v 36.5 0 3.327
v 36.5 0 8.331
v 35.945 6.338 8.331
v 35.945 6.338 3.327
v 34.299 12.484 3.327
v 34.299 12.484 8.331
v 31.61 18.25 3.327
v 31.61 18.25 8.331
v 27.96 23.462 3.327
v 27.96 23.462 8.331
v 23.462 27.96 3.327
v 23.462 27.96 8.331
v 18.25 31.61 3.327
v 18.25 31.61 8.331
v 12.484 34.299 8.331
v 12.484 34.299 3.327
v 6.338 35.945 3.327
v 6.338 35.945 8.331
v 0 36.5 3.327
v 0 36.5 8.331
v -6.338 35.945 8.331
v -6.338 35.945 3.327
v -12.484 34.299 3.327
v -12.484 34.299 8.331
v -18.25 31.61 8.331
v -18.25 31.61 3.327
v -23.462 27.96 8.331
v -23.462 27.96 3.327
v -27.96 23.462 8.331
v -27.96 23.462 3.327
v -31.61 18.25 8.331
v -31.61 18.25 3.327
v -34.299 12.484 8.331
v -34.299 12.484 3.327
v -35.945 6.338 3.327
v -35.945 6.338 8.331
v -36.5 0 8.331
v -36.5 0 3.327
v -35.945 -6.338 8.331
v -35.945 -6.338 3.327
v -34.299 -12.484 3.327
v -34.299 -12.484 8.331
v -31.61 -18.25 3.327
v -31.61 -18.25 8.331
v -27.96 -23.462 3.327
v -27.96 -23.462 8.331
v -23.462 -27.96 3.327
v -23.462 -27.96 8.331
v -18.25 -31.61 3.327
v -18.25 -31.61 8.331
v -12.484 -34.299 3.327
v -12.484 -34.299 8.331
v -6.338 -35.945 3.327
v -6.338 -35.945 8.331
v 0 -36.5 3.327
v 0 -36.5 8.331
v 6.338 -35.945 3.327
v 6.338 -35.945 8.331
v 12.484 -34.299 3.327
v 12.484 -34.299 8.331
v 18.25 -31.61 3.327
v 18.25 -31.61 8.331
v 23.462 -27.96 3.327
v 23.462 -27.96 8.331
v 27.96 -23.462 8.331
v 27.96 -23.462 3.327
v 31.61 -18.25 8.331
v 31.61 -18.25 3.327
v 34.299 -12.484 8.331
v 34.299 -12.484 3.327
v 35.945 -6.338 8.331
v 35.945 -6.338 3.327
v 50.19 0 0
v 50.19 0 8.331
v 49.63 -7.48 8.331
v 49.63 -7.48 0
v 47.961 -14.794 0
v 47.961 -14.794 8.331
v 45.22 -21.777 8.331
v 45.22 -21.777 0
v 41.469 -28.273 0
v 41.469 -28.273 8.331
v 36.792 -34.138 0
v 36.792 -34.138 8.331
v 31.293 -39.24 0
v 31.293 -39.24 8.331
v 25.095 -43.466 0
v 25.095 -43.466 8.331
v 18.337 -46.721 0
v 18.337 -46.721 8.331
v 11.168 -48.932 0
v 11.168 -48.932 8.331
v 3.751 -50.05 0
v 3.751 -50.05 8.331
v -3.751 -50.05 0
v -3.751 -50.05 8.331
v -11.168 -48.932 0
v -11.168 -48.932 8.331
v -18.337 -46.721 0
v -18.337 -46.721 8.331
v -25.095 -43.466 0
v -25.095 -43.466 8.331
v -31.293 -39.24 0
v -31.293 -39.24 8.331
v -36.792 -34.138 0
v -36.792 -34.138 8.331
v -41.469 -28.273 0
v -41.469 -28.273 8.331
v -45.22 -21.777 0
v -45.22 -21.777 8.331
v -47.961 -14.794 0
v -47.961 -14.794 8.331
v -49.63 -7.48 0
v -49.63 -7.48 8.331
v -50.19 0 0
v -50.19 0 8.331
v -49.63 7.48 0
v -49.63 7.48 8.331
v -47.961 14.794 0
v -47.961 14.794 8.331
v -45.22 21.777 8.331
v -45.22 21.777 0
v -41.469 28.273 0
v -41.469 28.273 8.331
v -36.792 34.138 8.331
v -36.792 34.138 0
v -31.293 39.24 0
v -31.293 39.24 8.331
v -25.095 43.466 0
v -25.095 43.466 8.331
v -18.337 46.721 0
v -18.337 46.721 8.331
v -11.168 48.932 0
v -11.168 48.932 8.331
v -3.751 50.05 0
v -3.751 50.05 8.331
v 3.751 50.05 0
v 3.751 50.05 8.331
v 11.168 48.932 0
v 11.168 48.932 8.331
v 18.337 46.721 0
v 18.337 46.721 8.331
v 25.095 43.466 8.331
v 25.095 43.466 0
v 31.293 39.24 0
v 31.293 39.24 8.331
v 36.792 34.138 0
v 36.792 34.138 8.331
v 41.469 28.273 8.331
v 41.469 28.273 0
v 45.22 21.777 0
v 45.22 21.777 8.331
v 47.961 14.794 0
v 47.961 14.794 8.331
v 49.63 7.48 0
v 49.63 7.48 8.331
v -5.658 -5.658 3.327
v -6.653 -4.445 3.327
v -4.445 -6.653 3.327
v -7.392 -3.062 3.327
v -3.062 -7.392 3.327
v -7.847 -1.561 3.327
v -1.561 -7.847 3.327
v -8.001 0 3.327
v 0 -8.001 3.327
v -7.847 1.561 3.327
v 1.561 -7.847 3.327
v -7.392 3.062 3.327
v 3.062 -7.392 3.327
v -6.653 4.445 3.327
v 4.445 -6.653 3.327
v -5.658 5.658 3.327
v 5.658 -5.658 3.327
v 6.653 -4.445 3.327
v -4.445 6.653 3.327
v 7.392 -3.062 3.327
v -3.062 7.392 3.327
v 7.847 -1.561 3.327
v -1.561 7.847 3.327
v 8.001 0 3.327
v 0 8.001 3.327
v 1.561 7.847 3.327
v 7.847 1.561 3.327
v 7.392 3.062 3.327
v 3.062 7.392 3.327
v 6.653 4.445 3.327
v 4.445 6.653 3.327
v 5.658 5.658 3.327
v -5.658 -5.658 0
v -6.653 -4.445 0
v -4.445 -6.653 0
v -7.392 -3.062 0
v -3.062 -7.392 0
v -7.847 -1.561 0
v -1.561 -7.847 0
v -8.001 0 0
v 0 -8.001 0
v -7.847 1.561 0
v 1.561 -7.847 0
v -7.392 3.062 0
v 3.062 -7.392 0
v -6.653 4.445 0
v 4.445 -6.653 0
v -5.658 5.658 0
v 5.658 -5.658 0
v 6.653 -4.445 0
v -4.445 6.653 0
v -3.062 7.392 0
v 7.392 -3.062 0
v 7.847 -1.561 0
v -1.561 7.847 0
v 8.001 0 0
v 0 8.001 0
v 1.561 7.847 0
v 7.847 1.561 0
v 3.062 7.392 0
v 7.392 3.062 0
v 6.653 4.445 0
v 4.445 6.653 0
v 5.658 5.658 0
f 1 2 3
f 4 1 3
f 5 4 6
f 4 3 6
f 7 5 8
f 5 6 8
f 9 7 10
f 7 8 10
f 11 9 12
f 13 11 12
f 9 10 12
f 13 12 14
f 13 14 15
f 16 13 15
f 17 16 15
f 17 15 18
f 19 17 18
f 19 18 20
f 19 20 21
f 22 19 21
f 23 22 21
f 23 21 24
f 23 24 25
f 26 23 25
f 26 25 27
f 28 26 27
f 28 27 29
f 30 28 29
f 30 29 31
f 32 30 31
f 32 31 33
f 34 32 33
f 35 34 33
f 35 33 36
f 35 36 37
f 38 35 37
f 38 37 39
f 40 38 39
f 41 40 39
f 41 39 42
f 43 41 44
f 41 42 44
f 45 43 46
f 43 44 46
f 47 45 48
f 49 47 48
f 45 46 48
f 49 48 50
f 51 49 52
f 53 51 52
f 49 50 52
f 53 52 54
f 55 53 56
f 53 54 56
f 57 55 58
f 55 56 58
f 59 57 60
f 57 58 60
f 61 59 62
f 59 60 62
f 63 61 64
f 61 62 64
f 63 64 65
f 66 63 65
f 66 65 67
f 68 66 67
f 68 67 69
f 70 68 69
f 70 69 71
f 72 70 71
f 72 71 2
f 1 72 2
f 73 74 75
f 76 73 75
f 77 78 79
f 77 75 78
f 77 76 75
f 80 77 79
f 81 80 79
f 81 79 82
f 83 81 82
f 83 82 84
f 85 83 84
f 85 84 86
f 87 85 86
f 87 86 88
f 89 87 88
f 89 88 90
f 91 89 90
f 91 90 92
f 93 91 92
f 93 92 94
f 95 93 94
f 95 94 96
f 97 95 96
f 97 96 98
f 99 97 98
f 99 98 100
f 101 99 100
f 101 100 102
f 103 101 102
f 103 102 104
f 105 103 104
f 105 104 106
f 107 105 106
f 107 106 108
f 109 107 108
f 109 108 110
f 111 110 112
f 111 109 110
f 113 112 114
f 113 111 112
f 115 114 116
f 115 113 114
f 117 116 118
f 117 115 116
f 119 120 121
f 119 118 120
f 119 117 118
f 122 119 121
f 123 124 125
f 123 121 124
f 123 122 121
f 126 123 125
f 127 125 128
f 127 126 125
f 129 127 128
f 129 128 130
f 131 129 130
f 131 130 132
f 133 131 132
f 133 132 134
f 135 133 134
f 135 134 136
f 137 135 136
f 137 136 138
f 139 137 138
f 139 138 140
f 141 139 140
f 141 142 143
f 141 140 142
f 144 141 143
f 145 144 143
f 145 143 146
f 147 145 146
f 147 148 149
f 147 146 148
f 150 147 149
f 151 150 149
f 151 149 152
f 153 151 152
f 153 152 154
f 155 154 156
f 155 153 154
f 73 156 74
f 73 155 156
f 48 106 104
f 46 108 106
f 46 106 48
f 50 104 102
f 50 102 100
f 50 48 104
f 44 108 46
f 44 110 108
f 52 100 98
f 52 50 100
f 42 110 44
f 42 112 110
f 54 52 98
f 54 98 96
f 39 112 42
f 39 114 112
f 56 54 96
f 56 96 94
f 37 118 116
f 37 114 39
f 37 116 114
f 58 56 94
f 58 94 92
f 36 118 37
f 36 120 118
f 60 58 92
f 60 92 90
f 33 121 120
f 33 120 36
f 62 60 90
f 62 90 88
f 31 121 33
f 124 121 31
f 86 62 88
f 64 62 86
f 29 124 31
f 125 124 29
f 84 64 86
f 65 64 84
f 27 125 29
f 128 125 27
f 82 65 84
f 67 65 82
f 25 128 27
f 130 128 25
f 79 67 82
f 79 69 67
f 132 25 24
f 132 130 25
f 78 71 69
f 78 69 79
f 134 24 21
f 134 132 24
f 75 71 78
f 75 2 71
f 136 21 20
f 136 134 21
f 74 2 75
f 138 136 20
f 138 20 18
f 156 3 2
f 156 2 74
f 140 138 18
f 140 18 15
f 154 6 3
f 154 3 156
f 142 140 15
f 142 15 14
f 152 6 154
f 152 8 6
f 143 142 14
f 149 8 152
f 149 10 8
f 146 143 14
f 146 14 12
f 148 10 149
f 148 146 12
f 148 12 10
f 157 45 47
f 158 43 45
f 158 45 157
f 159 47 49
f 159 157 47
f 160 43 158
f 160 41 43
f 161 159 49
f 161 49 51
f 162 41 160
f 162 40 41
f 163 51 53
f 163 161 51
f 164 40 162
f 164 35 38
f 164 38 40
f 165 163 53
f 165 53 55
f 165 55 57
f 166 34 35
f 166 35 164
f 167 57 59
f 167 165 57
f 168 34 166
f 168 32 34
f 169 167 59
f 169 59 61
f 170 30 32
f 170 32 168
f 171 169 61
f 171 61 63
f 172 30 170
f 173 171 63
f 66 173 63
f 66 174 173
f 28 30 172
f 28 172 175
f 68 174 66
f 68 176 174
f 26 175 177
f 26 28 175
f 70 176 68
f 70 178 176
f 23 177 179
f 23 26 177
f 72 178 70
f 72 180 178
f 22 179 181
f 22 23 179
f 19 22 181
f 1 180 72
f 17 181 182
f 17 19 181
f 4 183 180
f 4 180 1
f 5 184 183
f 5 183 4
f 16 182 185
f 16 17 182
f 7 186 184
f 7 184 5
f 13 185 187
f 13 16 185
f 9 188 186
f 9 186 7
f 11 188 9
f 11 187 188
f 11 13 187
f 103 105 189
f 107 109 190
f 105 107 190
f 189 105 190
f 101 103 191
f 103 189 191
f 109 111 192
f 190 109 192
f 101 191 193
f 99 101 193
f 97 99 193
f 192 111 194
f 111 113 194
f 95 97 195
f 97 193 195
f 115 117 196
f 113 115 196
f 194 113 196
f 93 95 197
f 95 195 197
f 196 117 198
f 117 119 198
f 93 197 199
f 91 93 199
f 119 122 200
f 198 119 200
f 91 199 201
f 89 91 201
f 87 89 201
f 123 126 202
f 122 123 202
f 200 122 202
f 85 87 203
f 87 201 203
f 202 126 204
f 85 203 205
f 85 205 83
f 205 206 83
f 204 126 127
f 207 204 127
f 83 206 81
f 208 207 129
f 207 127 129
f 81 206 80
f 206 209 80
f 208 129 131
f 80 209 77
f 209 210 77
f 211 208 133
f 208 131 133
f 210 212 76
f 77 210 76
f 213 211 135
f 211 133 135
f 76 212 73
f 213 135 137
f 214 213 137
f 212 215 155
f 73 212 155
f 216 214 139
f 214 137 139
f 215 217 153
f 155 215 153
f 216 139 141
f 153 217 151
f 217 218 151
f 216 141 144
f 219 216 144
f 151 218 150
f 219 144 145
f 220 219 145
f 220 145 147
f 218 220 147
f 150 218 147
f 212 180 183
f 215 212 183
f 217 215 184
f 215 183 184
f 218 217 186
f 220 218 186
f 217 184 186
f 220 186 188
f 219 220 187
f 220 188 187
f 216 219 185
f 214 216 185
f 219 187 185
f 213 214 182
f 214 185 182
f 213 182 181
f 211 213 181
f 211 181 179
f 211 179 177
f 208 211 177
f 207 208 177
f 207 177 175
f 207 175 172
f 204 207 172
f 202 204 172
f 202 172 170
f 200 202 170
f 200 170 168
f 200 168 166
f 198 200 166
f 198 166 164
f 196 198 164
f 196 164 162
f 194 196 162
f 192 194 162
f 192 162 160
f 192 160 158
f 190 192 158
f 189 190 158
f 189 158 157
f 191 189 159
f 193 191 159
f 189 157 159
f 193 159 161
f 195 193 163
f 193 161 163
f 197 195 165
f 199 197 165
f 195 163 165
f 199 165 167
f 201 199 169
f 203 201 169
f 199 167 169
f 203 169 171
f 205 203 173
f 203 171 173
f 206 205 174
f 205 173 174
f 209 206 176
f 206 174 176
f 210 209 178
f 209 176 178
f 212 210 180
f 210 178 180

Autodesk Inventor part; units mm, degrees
ref_plane "YZ Plane" through (0, 0, 0) normal (1, 0, 0) x (0, 1, 0)
ref_plane "XZ Plane" through (0, 0, 0) normal (0, 1, 0) x (-1, 0, 0)
ref_plane "XY Plane" through (0, 0, 0) normal (0, 0, 1) x (1, 0, 0)
sketch "Sketch1" plane through (0, 0, 0) normal (0, 0, 1) x (1, 0, 0)
  circle A0 centre (-29.7426, 29.7426) radius 3.2004 projected
  circle A1 centre (29.7426, -29.7426) radius 3.2004 projected
  circle A2 centre (0, 0) radius 8.001 projected
  circle A3 centre (0, 0) radius 50.1904 projected
extrude "Extrusion1" add sketch "Sketch1" along normal blind 8.3312 contours A0 | A1 | A2 | A3
sketch "Sketch2" plane through (0, 0, 8.3312) normal (0, 0, 1) x (1, 0, 0)
  circle A0 centre (0, 0) radius 50.1904 projected
  circle A1 centre (0, 0) radius 36.4998
  dimension "d2" = 72.9996
extrude "Extrusion2" cut sketch "Sketch2" against normal blind 5.0038 contours A1
sketch "Sketch3" plane through (0, 0, 3.3274) normal (0, 0, 1) x (1, 0, 0)
  circle A0 centre (0, 0) radius 36.4998 projected
  circle A1 centre (0, 0) radius 8.001
  dimension "d5" = 16.002
extrude "Extrusion3" cut sketch "Sketch3" against normal through all contours A1
properties part number "top plate washer"
